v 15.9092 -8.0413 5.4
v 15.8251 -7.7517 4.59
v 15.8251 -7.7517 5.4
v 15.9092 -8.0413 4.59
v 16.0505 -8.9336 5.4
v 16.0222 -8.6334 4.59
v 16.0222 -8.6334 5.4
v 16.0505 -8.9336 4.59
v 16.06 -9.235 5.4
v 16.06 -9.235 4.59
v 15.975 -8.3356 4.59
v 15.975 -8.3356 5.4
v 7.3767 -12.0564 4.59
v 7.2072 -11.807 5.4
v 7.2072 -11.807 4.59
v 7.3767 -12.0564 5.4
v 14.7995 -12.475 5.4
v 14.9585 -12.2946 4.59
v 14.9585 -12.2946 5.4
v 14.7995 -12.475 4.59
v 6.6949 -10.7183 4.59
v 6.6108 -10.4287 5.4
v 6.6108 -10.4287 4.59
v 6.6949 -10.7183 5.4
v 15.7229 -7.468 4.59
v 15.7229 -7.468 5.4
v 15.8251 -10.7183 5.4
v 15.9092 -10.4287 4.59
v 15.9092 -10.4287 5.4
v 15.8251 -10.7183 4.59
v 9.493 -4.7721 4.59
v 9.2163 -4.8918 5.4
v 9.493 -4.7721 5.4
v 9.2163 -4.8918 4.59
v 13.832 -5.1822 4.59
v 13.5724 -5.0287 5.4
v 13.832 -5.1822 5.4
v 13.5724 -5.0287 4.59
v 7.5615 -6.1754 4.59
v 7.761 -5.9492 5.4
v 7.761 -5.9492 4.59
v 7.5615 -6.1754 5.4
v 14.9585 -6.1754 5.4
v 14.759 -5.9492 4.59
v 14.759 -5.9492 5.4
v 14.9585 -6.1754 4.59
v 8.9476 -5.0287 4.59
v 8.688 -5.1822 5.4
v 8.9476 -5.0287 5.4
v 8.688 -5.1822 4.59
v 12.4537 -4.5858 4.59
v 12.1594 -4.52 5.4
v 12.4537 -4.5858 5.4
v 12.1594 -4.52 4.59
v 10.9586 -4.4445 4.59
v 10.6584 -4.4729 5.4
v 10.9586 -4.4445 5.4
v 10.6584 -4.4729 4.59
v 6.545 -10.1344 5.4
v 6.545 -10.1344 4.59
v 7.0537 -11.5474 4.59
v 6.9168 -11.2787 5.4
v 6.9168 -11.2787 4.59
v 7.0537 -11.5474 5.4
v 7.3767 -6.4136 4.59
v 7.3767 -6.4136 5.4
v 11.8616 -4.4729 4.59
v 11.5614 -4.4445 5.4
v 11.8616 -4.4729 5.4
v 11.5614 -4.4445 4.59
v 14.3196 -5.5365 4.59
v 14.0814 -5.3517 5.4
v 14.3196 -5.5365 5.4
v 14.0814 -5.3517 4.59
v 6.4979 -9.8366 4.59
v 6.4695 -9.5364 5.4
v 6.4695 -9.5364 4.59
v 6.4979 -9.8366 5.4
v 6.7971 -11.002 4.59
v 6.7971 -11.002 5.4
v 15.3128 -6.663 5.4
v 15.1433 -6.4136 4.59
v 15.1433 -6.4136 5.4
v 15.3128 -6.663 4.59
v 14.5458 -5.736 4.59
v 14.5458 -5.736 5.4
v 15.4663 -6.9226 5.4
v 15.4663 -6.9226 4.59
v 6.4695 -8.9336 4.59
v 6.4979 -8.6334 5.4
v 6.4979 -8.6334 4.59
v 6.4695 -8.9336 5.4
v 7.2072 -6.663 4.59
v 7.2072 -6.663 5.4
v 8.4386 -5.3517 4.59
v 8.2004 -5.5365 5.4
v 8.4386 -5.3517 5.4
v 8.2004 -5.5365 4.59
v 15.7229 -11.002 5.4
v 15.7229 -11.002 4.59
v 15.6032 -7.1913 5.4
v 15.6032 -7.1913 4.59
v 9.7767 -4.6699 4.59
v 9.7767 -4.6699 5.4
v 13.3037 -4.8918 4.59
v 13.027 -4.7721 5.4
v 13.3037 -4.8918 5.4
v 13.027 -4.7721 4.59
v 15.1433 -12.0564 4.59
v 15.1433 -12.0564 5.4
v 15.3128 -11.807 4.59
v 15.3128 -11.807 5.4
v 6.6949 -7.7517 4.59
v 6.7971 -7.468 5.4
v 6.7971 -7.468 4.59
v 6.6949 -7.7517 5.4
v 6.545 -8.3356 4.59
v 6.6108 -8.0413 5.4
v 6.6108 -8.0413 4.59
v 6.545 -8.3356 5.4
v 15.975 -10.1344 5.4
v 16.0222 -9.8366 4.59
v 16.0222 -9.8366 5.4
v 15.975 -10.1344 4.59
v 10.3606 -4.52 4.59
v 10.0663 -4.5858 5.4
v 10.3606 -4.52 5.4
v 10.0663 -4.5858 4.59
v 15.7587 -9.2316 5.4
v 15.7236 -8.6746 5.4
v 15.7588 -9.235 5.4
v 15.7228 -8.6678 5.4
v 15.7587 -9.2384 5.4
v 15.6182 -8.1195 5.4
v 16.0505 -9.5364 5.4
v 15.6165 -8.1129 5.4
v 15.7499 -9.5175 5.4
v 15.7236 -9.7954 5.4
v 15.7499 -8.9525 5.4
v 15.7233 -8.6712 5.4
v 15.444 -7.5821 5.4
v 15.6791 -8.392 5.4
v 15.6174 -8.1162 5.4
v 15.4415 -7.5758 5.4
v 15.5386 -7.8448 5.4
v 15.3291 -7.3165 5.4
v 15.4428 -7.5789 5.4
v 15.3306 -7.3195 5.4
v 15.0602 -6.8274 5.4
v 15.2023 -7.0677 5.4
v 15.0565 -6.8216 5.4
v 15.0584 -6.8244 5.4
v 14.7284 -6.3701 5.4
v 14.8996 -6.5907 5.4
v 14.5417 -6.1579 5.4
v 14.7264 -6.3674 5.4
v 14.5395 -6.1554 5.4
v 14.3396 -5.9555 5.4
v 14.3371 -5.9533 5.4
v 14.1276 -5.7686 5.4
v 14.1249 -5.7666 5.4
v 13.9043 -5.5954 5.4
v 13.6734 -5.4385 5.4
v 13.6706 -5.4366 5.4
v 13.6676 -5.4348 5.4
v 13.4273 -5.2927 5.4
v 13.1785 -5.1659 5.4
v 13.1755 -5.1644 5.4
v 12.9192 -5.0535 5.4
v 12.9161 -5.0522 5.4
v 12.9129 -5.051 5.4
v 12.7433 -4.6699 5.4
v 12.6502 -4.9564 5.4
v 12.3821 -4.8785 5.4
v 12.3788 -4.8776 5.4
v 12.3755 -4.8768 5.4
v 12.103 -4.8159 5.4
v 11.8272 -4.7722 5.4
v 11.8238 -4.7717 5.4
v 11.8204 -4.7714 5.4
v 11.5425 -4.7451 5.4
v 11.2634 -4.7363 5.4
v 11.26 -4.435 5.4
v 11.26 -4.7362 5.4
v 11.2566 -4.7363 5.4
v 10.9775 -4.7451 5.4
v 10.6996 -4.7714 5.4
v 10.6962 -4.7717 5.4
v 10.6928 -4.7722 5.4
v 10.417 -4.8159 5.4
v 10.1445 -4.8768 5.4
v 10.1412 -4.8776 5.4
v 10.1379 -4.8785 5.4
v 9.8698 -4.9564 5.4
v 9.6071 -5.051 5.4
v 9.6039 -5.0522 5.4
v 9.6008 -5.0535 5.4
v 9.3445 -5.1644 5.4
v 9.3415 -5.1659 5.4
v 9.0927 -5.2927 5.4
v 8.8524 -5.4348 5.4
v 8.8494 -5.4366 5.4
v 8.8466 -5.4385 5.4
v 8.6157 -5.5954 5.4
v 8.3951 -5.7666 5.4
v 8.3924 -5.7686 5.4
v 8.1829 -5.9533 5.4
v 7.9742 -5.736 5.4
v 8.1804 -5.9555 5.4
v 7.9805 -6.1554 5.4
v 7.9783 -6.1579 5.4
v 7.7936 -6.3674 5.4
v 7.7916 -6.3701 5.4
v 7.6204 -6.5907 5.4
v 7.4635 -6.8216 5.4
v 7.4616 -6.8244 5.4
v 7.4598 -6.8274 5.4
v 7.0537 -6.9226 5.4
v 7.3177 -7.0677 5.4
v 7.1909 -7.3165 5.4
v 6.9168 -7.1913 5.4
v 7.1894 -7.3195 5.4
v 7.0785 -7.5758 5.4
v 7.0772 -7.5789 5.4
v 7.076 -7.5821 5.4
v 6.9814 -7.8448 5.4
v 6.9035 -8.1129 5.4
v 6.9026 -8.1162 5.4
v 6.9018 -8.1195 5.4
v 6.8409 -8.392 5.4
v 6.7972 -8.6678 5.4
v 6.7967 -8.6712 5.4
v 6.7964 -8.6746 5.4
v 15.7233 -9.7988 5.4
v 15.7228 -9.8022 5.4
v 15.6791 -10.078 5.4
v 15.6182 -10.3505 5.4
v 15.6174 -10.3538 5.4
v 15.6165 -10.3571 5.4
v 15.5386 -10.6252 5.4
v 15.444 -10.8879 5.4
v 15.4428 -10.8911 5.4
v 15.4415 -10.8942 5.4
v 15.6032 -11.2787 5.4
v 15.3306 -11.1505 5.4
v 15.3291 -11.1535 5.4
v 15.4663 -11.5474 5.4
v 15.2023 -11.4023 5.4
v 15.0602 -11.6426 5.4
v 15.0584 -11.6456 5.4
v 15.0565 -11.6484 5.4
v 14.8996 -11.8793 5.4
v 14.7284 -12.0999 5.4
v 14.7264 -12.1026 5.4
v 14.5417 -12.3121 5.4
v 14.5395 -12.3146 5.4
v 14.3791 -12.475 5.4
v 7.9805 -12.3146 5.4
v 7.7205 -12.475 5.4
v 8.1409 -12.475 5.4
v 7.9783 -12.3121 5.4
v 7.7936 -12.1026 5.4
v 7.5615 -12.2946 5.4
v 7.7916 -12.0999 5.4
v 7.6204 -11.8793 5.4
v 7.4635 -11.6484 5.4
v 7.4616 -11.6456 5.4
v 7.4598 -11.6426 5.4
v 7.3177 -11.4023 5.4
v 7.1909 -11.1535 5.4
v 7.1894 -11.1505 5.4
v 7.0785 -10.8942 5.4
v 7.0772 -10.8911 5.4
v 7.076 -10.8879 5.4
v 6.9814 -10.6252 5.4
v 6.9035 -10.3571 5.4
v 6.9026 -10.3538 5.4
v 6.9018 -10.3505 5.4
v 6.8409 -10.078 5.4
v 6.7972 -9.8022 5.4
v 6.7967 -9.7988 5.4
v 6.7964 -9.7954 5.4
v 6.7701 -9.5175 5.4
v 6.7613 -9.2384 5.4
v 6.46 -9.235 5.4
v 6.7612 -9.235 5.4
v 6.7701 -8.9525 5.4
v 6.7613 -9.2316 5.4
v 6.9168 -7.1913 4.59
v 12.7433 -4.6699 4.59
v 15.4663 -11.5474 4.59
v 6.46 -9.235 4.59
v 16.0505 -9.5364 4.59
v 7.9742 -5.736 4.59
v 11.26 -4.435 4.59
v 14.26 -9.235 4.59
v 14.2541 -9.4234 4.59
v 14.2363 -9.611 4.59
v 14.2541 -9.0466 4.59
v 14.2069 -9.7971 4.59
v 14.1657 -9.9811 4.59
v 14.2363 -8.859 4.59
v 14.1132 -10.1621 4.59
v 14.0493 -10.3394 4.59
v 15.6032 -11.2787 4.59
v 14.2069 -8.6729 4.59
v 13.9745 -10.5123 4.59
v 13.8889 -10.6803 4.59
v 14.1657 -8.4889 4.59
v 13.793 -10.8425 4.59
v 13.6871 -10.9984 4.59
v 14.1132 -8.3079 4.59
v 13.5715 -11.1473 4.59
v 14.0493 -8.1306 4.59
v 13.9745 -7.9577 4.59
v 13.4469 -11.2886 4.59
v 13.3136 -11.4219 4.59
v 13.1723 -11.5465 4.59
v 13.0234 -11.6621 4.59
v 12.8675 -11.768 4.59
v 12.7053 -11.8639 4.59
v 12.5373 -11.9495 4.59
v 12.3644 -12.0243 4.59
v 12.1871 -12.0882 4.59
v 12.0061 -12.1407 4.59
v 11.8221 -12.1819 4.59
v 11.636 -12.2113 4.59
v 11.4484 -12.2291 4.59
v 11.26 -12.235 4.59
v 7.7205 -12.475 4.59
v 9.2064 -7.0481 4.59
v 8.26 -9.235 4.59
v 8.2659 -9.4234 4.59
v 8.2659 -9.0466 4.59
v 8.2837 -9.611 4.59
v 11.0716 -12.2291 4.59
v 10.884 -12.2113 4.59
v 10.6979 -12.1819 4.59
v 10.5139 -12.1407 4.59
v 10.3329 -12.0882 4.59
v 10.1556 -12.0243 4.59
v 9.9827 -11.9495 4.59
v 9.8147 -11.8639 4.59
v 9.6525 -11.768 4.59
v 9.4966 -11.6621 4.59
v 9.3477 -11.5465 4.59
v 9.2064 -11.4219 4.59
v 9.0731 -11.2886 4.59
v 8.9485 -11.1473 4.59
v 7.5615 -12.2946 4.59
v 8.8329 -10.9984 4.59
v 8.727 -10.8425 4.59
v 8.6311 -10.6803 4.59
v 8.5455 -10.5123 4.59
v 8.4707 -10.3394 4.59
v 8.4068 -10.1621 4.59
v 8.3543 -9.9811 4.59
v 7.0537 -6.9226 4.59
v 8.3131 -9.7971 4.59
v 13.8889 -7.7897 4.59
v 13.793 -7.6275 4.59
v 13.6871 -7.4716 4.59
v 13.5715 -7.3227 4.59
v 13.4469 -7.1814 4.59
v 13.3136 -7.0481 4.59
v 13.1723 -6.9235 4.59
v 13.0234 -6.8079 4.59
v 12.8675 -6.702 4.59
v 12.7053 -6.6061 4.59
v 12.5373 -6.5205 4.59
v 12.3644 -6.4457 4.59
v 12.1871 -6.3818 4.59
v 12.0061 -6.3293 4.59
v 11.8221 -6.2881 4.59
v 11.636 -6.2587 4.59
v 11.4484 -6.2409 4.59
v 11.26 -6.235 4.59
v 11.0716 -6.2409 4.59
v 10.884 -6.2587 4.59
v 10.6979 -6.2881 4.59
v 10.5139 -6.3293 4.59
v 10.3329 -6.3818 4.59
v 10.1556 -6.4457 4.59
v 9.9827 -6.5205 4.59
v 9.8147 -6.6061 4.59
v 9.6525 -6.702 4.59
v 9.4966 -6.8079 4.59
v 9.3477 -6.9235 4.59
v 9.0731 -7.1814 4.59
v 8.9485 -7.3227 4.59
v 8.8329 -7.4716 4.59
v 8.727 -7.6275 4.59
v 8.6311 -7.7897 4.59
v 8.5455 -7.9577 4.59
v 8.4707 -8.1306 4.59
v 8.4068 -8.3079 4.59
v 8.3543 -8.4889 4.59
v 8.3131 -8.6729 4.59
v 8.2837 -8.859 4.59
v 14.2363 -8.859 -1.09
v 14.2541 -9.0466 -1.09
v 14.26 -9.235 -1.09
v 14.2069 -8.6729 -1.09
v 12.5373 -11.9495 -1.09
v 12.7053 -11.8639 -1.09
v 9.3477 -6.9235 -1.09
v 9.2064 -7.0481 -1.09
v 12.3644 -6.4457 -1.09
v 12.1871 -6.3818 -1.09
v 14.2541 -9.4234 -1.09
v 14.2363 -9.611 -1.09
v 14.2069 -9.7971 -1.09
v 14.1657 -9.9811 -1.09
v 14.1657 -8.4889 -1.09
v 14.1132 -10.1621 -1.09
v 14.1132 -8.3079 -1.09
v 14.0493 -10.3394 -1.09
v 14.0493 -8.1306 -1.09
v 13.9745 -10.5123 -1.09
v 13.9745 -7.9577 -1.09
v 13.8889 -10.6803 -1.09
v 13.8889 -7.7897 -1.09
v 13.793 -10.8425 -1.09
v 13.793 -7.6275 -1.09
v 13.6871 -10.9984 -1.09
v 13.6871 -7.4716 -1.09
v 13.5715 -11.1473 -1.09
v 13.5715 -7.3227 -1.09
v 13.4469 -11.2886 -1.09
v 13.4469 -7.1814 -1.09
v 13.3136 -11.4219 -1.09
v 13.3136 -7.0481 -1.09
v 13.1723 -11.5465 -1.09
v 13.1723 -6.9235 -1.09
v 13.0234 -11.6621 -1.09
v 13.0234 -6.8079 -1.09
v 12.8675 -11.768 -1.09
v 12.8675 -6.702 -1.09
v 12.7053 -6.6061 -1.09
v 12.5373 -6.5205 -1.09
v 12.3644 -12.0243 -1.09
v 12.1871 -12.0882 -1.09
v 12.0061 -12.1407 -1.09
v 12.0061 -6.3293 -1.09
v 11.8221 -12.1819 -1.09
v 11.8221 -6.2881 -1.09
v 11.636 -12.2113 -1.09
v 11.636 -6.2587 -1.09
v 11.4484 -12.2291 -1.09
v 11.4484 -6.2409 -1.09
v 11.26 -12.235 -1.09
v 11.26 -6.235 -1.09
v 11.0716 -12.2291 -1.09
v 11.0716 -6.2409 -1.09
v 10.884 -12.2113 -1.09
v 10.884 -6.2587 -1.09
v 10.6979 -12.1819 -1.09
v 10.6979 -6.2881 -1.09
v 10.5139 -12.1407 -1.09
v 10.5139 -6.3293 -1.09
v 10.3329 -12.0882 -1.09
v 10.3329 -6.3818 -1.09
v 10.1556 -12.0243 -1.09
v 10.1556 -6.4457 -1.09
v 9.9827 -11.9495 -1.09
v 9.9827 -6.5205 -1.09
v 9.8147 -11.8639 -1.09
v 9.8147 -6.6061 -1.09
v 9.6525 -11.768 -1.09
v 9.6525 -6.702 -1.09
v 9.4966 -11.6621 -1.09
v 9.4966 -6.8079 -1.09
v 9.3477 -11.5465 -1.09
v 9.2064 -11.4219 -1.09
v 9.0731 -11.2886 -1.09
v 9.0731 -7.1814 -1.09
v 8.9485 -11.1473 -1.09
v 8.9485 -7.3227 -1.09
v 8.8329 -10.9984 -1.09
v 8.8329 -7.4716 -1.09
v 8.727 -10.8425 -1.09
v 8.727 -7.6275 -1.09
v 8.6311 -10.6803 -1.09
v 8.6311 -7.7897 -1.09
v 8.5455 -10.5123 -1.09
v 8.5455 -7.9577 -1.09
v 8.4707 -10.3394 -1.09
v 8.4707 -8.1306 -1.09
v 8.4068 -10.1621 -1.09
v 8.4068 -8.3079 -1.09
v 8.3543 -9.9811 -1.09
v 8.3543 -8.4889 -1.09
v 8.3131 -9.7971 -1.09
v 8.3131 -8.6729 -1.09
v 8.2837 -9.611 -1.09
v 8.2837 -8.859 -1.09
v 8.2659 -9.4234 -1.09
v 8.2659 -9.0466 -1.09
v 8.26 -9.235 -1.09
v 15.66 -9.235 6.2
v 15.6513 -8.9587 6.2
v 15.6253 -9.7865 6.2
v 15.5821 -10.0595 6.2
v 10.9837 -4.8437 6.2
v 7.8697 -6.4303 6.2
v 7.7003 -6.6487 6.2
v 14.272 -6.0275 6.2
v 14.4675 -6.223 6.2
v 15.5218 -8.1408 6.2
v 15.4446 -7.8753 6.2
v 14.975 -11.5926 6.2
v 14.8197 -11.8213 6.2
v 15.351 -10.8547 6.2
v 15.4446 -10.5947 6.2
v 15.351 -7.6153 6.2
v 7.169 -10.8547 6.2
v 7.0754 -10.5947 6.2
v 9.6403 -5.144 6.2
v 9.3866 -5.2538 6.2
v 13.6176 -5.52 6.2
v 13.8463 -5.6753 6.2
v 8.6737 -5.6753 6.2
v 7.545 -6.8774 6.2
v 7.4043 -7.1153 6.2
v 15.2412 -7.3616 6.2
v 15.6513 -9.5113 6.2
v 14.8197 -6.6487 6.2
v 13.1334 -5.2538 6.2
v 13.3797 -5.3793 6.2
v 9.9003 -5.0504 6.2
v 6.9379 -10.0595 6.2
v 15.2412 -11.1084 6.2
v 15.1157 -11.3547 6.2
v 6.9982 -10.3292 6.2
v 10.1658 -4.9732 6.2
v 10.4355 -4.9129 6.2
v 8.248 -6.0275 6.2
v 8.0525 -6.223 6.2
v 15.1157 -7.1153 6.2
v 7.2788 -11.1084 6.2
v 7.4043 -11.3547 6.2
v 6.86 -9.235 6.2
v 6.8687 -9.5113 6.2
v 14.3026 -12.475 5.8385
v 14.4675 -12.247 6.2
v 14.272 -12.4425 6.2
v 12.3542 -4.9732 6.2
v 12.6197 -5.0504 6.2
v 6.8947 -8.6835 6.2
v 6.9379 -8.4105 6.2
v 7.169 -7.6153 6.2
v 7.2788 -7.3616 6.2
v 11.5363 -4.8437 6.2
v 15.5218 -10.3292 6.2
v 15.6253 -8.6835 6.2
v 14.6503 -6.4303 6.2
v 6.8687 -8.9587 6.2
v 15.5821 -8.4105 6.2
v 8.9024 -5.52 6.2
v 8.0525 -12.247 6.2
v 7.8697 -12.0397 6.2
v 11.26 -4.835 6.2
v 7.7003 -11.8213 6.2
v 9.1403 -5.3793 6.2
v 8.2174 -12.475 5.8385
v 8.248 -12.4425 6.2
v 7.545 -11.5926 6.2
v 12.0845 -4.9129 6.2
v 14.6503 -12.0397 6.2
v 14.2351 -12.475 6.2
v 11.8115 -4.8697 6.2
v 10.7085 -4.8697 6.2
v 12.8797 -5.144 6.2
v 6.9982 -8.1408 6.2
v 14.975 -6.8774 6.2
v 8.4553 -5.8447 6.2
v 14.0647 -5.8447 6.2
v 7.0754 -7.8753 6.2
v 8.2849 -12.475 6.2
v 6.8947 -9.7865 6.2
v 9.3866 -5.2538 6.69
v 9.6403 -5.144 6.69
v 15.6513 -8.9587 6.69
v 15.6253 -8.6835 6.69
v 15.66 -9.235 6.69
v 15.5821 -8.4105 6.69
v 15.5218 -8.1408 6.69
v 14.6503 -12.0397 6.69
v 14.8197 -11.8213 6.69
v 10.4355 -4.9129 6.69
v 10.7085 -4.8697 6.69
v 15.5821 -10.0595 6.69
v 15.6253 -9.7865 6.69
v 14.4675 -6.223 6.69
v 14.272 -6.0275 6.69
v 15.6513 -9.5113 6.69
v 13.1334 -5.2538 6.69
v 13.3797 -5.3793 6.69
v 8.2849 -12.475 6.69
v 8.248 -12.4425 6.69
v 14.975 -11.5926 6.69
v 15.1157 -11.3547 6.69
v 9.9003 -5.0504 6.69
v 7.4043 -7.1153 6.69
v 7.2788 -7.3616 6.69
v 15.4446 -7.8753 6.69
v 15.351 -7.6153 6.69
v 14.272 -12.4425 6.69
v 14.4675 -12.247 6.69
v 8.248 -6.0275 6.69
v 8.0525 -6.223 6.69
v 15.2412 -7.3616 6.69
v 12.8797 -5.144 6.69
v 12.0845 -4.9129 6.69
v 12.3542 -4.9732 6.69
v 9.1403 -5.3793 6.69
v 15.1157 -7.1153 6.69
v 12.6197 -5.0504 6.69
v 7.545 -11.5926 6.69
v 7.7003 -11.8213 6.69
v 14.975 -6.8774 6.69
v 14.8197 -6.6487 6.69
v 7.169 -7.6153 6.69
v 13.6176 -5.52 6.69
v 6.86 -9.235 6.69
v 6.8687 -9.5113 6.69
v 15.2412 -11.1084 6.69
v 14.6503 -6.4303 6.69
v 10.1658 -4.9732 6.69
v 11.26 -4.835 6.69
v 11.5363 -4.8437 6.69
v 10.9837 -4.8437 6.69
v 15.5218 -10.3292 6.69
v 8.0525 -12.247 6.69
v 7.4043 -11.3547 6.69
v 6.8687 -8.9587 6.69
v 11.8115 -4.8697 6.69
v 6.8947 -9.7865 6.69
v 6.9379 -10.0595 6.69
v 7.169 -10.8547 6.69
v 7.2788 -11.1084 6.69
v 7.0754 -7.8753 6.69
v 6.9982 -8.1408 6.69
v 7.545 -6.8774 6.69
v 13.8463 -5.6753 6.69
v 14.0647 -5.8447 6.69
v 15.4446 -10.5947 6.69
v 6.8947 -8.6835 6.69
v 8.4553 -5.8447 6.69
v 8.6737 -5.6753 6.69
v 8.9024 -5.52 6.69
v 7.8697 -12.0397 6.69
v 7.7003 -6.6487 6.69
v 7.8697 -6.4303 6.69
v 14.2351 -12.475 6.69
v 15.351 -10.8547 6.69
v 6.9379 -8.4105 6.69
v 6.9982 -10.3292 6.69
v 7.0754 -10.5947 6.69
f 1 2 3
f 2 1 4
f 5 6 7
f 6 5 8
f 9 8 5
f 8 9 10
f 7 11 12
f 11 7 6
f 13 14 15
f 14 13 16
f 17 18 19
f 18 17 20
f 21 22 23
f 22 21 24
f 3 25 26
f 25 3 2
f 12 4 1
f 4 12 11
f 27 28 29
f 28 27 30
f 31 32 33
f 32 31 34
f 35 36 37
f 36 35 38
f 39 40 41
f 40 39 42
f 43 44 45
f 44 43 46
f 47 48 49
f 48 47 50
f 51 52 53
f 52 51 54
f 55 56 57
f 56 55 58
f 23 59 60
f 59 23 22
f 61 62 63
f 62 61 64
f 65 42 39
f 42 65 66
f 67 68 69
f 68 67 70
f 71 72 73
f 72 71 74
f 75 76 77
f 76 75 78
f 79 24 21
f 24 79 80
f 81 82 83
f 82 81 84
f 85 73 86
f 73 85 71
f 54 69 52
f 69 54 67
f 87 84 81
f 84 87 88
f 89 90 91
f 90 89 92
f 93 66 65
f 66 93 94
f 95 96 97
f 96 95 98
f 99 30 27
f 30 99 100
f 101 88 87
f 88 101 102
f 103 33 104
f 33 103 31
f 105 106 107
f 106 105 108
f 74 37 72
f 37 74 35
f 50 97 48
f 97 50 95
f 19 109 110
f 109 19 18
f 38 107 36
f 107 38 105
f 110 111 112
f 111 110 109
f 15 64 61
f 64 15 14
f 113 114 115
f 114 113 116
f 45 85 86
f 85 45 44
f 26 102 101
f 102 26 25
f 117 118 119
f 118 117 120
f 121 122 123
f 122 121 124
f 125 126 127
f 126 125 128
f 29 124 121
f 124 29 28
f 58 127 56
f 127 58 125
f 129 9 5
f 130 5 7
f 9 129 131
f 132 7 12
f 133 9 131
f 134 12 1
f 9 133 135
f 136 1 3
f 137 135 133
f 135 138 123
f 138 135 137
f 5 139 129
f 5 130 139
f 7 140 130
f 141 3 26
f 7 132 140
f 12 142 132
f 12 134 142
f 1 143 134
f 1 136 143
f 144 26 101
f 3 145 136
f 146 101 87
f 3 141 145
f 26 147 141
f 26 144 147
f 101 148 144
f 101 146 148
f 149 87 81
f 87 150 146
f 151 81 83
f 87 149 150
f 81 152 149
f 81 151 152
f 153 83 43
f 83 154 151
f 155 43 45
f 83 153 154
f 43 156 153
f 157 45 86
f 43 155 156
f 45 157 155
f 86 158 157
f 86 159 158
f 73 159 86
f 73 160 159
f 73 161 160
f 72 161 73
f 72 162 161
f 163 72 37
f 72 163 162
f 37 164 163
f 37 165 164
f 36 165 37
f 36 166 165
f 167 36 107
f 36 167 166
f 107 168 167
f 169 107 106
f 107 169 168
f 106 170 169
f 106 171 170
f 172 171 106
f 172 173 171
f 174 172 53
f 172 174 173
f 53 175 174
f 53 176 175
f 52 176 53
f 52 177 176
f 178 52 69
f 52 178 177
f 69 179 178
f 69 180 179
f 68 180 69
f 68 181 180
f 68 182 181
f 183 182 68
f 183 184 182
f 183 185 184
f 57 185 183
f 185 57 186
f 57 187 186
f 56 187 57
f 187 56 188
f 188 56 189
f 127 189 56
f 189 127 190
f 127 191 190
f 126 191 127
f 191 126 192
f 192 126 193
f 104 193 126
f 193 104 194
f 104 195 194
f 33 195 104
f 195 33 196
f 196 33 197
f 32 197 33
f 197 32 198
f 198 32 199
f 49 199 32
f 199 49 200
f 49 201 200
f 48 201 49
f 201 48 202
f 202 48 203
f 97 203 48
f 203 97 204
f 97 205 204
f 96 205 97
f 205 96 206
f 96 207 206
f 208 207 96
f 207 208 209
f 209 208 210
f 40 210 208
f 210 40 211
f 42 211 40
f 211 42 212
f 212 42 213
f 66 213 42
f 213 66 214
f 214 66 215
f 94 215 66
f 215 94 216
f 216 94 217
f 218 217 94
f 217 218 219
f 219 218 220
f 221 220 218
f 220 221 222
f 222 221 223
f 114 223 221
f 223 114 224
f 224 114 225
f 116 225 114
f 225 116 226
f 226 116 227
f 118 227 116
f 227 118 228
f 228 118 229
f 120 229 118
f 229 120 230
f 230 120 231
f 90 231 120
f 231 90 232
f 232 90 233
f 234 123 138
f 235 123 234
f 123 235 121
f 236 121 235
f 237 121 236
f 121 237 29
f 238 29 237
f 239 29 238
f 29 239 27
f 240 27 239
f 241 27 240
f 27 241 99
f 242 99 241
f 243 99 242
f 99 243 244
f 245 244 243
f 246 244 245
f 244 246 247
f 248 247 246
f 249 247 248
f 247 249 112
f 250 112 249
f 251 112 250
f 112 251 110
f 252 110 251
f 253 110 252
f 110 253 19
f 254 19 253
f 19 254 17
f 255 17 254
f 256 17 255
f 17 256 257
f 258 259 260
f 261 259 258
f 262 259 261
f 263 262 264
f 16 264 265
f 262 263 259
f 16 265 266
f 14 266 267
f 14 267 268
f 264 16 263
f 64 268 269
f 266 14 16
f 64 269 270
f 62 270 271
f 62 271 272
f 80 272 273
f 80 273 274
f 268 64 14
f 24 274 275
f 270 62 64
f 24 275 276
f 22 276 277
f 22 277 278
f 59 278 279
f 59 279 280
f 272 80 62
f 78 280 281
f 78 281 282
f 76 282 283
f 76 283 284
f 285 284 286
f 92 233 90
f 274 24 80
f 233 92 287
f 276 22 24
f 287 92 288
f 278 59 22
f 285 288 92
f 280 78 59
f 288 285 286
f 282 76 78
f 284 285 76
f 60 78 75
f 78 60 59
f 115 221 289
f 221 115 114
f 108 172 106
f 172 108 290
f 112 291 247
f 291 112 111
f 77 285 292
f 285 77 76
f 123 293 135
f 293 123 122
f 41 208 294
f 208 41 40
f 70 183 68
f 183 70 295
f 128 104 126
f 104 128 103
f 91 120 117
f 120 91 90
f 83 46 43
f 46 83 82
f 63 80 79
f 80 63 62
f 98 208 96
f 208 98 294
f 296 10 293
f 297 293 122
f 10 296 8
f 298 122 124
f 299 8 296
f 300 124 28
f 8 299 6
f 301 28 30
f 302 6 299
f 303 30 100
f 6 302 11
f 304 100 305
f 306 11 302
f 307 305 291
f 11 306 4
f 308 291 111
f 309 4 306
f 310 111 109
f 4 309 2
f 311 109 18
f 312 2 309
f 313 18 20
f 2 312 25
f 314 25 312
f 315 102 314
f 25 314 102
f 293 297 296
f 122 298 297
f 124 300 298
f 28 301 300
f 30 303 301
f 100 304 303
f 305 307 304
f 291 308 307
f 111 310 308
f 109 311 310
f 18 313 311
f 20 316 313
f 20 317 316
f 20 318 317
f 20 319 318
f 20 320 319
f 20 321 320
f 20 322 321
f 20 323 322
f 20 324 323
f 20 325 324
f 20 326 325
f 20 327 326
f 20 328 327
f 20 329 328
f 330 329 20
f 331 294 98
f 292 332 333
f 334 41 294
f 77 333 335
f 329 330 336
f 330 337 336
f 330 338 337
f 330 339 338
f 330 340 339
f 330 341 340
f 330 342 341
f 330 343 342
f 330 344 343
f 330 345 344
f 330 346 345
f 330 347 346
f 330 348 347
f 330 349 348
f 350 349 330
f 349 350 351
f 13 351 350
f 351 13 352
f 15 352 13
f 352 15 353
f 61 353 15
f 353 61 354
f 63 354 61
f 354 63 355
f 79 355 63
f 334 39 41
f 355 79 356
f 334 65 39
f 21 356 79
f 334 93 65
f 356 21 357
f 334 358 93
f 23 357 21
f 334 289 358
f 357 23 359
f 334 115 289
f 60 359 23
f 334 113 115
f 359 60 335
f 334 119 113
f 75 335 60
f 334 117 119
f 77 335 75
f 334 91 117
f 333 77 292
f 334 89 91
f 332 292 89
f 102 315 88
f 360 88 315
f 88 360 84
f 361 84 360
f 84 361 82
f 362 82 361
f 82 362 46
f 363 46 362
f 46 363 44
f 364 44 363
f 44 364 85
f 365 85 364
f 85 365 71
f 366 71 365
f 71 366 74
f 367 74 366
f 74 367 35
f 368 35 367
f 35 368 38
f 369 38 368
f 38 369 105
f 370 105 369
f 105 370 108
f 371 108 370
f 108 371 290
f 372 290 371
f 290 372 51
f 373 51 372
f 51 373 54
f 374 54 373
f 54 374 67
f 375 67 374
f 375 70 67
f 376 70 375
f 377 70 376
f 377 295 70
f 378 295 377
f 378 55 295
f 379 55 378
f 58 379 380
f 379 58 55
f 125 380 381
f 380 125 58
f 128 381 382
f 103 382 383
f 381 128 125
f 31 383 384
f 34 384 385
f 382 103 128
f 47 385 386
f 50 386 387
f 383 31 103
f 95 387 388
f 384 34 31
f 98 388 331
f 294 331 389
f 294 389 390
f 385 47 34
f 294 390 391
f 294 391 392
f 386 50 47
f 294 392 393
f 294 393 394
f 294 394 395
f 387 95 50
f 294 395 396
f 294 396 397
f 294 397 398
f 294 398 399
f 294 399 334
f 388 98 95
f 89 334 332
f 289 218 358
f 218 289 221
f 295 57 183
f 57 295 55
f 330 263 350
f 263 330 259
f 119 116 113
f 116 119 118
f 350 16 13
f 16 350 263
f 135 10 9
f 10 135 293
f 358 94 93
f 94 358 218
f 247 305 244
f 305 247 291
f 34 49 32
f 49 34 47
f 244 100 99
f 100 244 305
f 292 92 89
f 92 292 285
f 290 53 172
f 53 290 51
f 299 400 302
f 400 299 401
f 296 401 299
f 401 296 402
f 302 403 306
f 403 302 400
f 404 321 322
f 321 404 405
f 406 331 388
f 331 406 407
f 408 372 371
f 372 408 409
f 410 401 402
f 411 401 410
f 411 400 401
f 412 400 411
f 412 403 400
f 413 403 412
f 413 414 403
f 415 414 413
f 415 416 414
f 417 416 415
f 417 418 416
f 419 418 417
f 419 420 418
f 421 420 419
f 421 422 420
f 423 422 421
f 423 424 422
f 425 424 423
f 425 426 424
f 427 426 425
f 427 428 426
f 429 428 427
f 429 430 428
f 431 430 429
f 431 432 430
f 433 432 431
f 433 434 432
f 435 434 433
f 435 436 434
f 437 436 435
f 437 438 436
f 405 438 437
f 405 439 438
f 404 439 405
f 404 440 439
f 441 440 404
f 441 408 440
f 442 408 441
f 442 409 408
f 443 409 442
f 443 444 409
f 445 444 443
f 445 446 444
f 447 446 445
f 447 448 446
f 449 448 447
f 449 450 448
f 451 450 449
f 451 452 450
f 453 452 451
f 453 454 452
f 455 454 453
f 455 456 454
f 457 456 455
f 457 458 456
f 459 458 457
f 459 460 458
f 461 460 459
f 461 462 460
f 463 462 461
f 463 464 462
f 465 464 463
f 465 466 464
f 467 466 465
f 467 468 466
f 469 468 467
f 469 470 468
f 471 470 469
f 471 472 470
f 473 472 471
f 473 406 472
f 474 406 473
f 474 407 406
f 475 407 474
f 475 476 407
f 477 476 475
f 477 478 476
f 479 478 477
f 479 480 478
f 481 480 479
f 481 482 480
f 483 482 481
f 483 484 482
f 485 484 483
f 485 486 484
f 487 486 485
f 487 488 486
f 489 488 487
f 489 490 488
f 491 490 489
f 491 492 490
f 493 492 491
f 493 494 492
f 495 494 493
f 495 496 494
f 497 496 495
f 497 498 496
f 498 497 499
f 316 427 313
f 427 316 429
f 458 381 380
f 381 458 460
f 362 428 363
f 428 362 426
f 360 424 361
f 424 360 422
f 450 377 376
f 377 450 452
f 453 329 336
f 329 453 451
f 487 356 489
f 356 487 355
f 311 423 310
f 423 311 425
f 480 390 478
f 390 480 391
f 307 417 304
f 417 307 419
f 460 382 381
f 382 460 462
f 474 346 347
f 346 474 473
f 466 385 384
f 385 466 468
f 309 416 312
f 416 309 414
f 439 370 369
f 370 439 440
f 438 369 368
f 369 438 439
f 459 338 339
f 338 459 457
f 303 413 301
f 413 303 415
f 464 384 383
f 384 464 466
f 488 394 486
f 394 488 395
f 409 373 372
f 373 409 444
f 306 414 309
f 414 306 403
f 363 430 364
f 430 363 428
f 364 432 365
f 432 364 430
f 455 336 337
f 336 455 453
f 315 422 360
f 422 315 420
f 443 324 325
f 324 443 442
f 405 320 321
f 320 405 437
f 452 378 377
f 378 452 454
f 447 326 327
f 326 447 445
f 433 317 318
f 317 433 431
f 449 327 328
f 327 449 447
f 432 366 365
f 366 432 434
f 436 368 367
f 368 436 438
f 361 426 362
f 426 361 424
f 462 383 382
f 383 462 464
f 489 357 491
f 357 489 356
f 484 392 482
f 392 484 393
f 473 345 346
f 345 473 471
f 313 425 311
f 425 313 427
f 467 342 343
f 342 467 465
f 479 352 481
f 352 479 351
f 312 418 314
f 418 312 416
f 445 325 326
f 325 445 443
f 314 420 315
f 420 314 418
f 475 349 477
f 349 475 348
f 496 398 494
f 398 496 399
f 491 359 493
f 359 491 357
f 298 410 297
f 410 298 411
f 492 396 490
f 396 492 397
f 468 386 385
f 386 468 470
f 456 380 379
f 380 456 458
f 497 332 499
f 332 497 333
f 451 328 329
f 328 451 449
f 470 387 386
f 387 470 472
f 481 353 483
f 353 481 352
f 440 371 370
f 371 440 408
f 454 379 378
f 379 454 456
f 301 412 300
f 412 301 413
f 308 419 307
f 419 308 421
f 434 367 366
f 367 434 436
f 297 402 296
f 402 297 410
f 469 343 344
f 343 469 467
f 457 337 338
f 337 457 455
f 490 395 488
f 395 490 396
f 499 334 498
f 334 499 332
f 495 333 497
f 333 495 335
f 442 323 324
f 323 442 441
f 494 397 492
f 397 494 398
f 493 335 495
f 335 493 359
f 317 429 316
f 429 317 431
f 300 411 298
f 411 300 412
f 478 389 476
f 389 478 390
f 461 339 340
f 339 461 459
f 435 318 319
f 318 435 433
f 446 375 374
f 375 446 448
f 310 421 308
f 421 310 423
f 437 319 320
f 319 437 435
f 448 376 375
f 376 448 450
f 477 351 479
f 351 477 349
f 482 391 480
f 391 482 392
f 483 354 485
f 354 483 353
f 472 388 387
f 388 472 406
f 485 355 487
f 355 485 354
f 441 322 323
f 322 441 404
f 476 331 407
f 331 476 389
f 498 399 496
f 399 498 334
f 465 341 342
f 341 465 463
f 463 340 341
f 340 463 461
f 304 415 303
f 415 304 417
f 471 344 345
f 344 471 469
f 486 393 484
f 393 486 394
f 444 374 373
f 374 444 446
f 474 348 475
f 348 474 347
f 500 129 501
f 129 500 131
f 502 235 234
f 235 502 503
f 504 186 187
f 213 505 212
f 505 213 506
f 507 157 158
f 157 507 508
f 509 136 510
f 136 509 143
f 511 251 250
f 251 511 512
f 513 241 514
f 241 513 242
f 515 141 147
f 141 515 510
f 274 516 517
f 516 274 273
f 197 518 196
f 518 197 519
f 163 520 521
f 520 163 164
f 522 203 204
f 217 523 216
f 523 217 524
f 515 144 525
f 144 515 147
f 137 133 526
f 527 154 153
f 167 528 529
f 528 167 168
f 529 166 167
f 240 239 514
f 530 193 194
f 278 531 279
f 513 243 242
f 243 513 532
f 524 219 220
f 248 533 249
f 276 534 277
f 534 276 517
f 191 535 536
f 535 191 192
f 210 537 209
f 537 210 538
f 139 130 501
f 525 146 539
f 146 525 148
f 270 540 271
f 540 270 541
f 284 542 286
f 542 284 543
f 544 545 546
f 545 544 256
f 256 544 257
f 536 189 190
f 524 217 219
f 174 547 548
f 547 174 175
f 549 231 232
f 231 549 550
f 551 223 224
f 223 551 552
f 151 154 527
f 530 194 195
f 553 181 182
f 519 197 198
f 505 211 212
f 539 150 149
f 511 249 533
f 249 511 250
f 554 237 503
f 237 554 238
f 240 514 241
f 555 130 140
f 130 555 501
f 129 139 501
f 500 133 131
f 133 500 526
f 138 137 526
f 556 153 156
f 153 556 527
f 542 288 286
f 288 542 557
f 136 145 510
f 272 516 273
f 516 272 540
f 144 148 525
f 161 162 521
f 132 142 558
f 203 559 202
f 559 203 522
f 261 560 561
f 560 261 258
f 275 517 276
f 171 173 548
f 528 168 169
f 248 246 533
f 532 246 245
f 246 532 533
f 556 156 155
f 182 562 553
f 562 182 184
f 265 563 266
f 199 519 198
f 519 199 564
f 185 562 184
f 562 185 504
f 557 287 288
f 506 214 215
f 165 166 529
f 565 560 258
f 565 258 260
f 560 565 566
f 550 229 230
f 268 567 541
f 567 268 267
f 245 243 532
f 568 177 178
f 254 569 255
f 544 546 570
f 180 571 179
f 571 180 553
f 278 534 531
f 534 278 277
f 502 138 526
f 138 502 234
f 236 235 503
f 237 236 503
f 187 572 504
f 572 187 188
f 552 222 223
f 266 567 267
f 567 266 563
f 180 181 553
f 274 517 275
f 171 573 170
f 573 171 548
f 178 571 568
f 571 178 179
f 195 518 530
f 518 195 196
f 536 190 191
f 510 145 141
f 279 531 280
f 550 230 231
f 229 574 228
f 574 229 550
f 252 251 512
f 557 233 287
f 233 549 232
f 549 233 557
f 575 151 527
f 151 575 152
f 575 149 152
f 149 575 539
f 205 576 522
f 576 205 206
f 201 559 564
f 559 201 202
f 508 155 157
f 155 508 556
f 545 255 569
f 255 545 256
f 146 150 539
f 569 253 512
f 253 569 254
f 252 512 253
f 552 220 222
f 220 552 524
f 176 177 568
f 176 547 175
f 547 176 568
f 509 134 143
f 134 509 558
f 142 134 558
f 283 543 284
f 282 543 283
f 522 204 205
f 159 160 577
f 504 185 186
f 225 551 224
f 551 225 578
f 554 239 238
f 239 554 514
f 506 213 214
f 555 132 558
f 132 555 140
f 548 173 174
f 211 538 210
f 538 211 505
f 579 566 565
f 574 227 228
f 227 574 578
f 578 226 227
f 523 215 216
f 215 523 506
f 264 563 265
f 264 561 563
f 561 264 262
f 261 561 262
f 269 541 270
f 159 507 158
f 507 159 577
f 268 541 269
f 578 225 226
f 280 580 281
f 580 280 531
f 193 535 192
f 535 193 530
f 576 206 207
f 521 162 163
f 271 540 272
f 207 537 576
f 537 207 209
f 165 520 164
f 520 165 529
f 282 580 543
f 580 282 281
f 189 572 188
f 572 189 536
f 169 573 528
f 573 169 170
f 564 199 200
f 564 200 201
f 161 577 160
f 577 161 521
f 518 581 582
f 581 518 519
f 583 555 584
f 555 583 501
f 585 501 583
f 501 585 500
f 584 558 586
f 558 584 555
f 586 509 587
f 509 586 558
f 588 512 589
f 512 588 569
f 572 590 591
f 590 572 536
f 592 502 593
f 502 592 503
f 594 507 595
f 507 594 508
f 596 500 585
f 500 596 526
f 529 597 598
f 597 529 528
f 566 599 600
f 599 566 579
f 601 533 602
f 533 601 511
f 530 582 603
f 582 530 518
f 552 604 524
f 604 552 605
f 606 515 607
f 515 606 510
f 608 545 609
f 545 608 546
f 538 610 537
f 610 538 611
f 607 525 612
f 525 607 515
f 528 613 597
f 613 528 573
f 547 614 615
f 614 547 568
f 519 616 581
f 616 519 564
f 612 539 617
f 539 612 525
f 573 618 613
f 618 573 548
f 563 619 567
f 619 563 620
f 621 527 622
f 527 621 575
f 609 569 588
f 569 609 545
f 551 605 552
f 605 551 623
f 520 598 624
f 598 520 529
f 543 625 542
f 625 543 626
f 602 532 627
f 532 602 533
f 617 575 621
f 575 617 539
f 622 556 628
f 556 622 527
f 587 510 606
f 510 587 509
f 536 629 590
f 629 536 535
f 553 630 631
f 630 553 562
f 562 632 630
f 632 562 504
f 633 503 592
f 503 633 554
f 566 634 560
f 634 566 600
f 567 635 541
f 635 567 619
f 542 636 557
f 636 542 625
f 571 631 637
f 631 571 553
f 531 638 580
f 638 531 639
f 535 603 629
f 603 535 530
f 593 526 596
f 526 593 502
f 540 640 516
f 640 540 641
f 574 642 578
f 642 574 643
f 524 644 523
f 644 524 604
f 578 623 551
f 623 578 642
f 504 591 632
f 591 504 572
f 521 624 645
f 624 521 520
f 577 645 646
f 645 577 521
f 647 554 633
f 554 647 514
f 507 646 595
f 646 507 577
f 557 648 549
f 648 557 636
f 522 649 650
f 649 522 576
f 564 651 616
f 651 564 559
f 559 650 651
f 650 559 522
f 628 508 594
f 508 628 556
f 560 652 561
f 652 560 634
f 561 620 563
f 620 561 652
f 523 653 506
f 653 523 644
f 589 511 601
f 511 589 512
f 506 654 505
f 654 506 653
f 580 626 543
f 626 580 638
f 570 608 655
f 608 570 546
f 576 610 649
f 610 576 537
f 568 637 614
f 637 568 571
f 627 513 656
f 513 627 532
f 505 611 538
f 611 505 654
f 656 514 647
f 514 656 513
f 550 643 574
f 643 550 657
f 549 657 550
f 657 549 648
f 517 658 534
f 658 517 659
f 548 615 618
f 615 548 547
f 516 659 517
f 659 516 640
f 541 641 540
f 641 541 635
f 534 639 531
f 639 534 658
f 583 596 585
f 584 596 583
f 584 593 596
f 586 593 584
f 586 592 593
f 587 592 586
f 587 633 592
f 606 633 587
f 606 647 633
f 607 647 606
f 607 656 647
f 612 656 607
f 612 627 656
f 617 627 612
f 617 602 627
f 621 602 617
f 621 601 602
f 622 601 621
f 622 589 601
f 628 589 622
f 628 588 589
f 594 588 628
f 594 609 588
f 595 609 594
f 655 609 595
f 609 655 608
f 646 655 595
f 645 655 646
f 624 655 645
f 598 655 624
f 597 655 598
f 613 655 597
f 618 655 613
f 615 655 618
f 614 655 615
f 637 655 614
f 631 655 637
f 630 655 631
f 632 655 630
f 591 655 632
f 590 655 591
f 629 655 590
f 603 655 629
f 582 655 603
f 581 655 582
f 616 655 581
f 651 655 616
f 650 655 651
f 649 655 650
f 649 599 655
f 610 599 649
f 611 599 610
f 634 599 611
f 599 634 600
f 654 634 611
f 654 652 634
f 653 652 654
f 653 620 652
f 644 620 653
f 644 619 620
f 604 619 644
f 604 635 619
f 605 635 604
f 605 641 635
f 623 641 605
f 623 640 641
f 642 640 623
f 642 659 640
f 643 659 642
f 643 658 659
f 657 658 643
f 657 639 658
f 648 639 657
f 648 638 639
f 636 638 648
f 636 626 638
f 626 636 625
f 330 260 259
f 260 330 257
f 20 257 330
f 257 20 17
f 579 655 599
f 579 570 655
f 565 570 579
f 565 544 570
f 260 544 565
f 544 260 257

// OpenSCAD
fn = 100;
fs = 0.6;
eps = 0.01;
w = 1.2;

nano_length = 44 + 0.5;
nano_width = 17.7 + 0.5;
nano_height = 1.65 + 0.3;

nano_anthena_length = 15.3 + 0.5;
nano_anthena_width = 10 + 0.5;
nano_anthena_height = 4 + 0.3;

nano_usb_length = 5.6 + 0.5;
nano_usb_width = 7.6 + 0.5;
nano_usb_height = 4.3 + 0.3;

nano_middle_width = 13.7;


battery_holder_length = 23.7 + 0.5;
battery_holder_width = 28 + 0.5;
battery_holder_height_nc = 1.6; // 1.6 sharp without clerance
battery_holder_height = battery_holder_height_nc + 0.2;
battery_d = 20 + 0.5;
battery_and_holder_length = 25.15;

battery_and_holder_height_nc = 5.78;  // 5.78 max without clearance
battery_and_holder_height = battery_and_holder_height_nc + 0.4;

battery_upper_length = 15 + 0.5;
battery_upper_width = 21.3 + 0.5;
battery_only_height_nc = battery_and_holder_height_nc - battery_holder_height_nc;

battery_hole_d = 2.5;
battery_hole_y_offset = (20.7 + battery_hole_d) / 2;
battery_hole_x_offset = (16 + battery_hole_d) / 2;

hole_from_edge_x = battery_holder_length / 2 - battery_hole_x_offset;
hole_from_edge_y = battery_holder_width / 2 - battery_hole_y_offset;

module nano() {
  translate([0,0, nano_height/2])
  cube([nano_length,nano_width,nano_height], center = true);

//  translate([5,0, nano_usb_height/2])
//  cube([nano_length - nano_usb_length - nano_anthena_length - 2,
//       nano_middle_width, nano_usb_height], center = true);

  translate([-nano_length/2 + nano_anthena_length / 2,
      0,
      nano_anthena_height / 2])
    cube([nano_anthena_length,
        nano_anthena_width,
        nano_anthena_height], center = true);

  translate([nano_length/2 - nano_usb_length / 2,
      0,
      nano_usb_height / 2])
    cube([nano_usb_length,
        nano_usb_width,
        nano_usb_height], center = true);

  // contacts
  translate([-nano_length/2 + 6.5, - 1.4 + nano_width/2, 0]) cylinder(d=2, h=4.5, $fn=10);
  translate([ nano_length/2 - 6.0, - 1.4 + nano_width/2, 0]) cylinder(d=2, h=4.5, $fn=10);
}

module battery() {
  difference() {
    union() {
      translate([0,0,battery_holder_height/2]) cube([battery_holder_length,
          battery_holder_width,
          battery_holder_height
      ], center = true);
      target_offset = battery_and_holder_length - battery_holder_length;
      edge_offset = battery_holder_length / 2 - battery_d / 2;
      translate([-edge_offset - target_offset, 0, battery_holder_height]) {
        cylinder(d=battery_d, h=battery_only_height_nc - 0.2, $fn=40);
        translate([0,0, (battery_and_holder_height - battery_holder_height)/2])
          cube([battery_upper_length,
              battery_upper_width,
              battery_only_height_nc], center = true);
      }
    };
    union() {
      translate([-battery_hole_x_offset, -battery_hole_y_offset, -eps])
        cylinder(d = battery_hole_d, h=battery_and_holder_height + eps * 2, $fn=10);
      translate([ battery_hole_x_offset, -battery_hole_y_offset, -eps])
        cylinder(d = battery_hole_d, h=battery_and_holder_height + eps * 2, $fn=10);
      translate([-battery_hole_x_offset,  battery_hole_y_offset, -eps])
        cylinder(d = battery_hole_d, h=battery_and_holder_height + eps * 2, $fn=10);
      translate([ battery_hole_x_offset,  battery_hole_y_offset, -eps])
        cylinder(d = battery_hole_d, h=battery_and_holder_height + eps * 2, $fn=10);
    };
  }
}

button_width = 6.18 + 0.5;
button_height = 3.5 + 0.5;
button_d = 3.4 + 0.5;
button_d_h = 4.9 + 0.5;
button_d_h_real = 4.9;

module button() {
  translate([0,0,button_height/2])
  cube([button_width, button_width, button_height], center = true);
  cylinder(d = button_d, h = button_d_h, $fn = 20);
}

middle_pad = 0.2;

screw_outer_d = 10;
button_offset_x = nano_length - button_width / 2 - screw_outer_d / 2 - hole_from_edge_y;
button_offset_y = button_width / 2;


module components() {
  nano_offset_y = box_width - nano_width;
  nano_offset_z = battery_and_holder_height + middle_pad;

  color("green")
    translate([button_offset_x, button_offset_y, w])
      button();

  color("blue")
    translate([battery_holder_width / 2,
        battery_holder_length / 2,
        battery_and_holder_height + w])
    rotate(-90, [0,0,1])
    rotate(180, [1,0,0])
    battery();

  color("cyan")
    translate([nano_length/2, nano_width/2 + nano_offset_y, w + nano_offset_z])
    rotate(180, [0,0,1])
    nano();
}

box_length = nano_length;
box_width = battery_and_holder_length;
box_height = nano_usb_height + middle_pad + battery_and_holder_height;

// ================================


module origin(x = 0, y = 0, z = 0) {
  translate([-box_length/2 + x, -box_width/2 + y, -box_height/2 + z]) children();
}

module legacy_origin() {
  origin(0, 0, -w) children();
}

module origin_all(q) {
  origin(q, q, q) children();
}

module mirrorX() { mirror([1,0,0]) children(); }
module mirrorY() { mirror([0,1,0]) children(); }
module mirrorZ() { mirror([0,0,1]) children(); }
module dupX() { children(); mirrorX() children(); }
module dupY() { children(); mirrorY() children(); }
module dupZ() { children(); mirrorZ() children(); }
module dupAll() { dupX() dupY() dupZ() children(); }

module cylinders(values, idx = 0) {
  if (idx < len(values)) {
    cylinder(h = values[idx][0] + eps, d1 = values[idx][1], d2 = values[idx][2], $fs=fs, $fa=1, $fn=fn);
    translate([0, 0, values[idx][0]])
      cylinders(values, idx + 1);
  }
}

// ================================

module simple_box_verbose(offx, offy, offz) {
  cube([box_length + 2 * offx, box_width + 2 * offy, box_height + 2 * offz], center = true);
}
module simple_box(off) {
  simple_box_verbose(off, off, off);
}

// Slower variant
module box1(off) {
  round_corner = 3;
  mul = sqrt(2);
  difference() {
    simple_box(off);

    // Subtract boxes from corners
    dupAll()
      origin_all(-off - eps) 
        cube(round_corner + off - eps);
  }

  // Add sphere to corner
  dupAll()
  intersection() {
    origin_all(-off) cube(round_corner + off);
    origin_all(round_corner)
      sphere(r = (round_corner + off) * mul, $fs=fs, $fa=1, $fn=fn);
  }
}

// Fast variant
module box2(off) {
  round_corner = 3;
  mul = sqrt(2);

  cube([box_length - 2 * round_corner + eps, box_width + 2 * off, box_height + 2 * off], center = true);
  cube([box_length + 2 * off, box_width - 2 * round_corner + eps, box_height + 2 * off], center = true);
  cube([box_length + 2 * off, box_width + 2 * off, box_height - 2 * round_corner + eps], center = true);

  // Add sphere to corner
  intersection() {
    simple_box(off);
    dupAll()
      origin_all(round_corner)
      sphere(r = (round_corner + off) * mul, $fs=fs, $fa=1, $fn=fn);
  }
}

module box(off) { box2(off); }

module bottom_screw_offset(off = 0) {
  origin(hole_from_edge_y, hole_from_edge_x, -off) children();
}

screw_bottom_height = battery_only_height_nc - 0.2;
screw_narrow_height = 1.5;
screw_cap = 5.5; // with clearance

module screw_add() {
  bottom_screw_offset() {
    cylinders([[screw_bottom_height,screw_outer_d,screw_outer_d]]);
  }
}

module screw_sub() {
  cap_height = w + screw_bottom_height - screw_narrow_height;
  bottom_screw_offset(w + eps) {
    cylinders([[cap_height, screw_cap + 1, screw_cap], [screw_narrow_height + 3 * eps, 3.5, 3.5]]);
  }
}

module screw_support() {
  cap_height = w + screw_bottom_height - screw_narrow_height;
  support_z_clearance = 0.35;
  bottom_screw_offset(w + eps) {
    cylinders([[cap_height - support_z_clearance, screw_cap - 0.5, screw_cap - 0.5]]);
  }
}


module screw_top(len) {
  screw_thread = 2.9;
  mirrorZ() bottom_screw_offset() difference() {
    cylinders([[len, 6, 6]]);
    cylinders([[len + 2 * eps, screw_thread-0.2, screw_thread]]);
  }
}

module top_plain() {
  translate([-30,-20,0])
  cube([60,40,20]);
}

// Divisor slope calculation
z0 = box_height / 2;
z1 = -box_height / 2 + battery_only_height_nc / 2;

module plain_transform(off = 0) {
  dz = z0 - z1;
  angle = atan2(dz, box_width);
  move = (z0 + z1) / 2 + off;
  translate([0,0,move])
  rotate(angle, [1,0,0])
  children();
}

module battery_bracket() {
  color("red")
  translate([-w, 0, 0])
    cube([w, hole_from_edge_x, battery_and_holder_height_nc]);
  cube([hole_from_edge_y, hole_from_edge_x, screw_bottom_height]);
}

module cord1() {
  mirrorX() mirrorY()
  origin()
  rotate(45, [0,0,1])
  rotate(90, [0,1,0])
  cylinder(d=2, h=10, center = true, $fs=fs, $fa=1, $fn=fn);
}

module cord() {
  translate([0,-3, 4.7]) cord1();
  translate([-3, 0, 1.7]) cord1();
}

// ziplock triangle
module lock_transform() {
  mirrorX() mirrorY() mirrorZ() origin() children();
}

triangle_sz = 2.6;

pin_length = 3;
pin_up_length = 3;
pin_spacing_length = 2.5;
pin_stride = pin_length + pin_up_length + 2 * pin_spacing_length;
base_clearance = 0.2;
padding_in = 3;
num_pins = floor((box_length - pin_length - 2 * padding_in) / pin_stride);
padding = (box_length - (pin_stride * num_pins + pin_length)) / 2;
clearance_y = base_clearance;

module triangle() {
  translate([padding, clearance_y, 0])
  rotate(90, [0,1,0])
    linear_extrude(box_length - padding * 2)
    polygon([[0,0],[-triangle_sz, 0],[0, triangle_sz]]);
}

// lock_transform() 


module zipper(clearance) {

  for (x = [0 : num_pins]) {
    translate([padding + pin_stride * x - clearance / 2,
               -w - clearance_y - eps,
               triangle_sz - w - clearance / 2])
      cube([pin_length + clearance, w + 2 * clearance_y + 2 * eps, w + clearance]);
  }

  translate([padding, clearance_y, -w])
  cube([box_length - padding * 2, triangle_sz, w]);

  for (x = [0 : num_pins - 1]) {
    translate([padding + pin_length + pin_spacing_length + pin_stride * x - clearance / 2,
               -w - eps - clearance_y,
               -w - eps - clearance / 2])
      cube([pin_length + clearance,
            w + 2 * clearance_y + 2 * eps,
            w + clearance + eps]);
  }

}

//lock_transform() {
// triangle();
//
//  color("red")
//    zipper(0);
//
//  difference() {
//    translate([0,-w,-w]) cube([box_length, w, w + triangle_sz]);
//    zipper(0.5);
//  }
//}


module bottom() {
  difference() {
    // Shell
    box(w);

    // Shell subtractions
    box(eps);
    plain_transform(-0.1) top_plain();
    cord();
    dupX() screw_sub();
    lock_transform() zipper(base_clearance);
  }

  lock_transform() 
  difference() {
    translate([padding,-w,-w])
      cube([box_length - padding * 2, w, w]);
    zipper(base_clearance);
  }

  dupX() screw_support();

  intersection() {
    box(0);

    // Additions restricted to internal space
    union() {
      dupX() {
        difference() { screw_add(); screw_sub(); }
      }
      mirrorY() origin() battery_bracket();
    }
  }

  // nano right support
  difference() {
    union() {
      mirrorX() mirrorY() origin() cube([w, nano_width, battery_and_holder_height_nc]);
      mirrorX() mirrorY() origin() cube([box_length - battery_holder_width, w, battery_and_holder_height_nc]);
    }
    cord();
  }

  // battery right support
  dupY() translate([battery_holder_width, 0, 0]) origin() mirrorX() battery_bracket();


  // Button brackets
  {
    sep_w = w;
    origin() translate([button_offset_x - button_width/2 - sep_w, 0, 0])
      cube([sep_w, button_width, button_height]);

    origin() translate([button_offset_x - w/2, button_width, 0])
      cube([w, 3, button_height]);
  }


}

shaft_d = 11;
module button_shaft() {
  cylinders([[nano_usb_height - nano_height + w, shaft_d, shaft_d]]);
}

module button_cap(off, top_height = 1.6, button_stick_out=0, eps = 0) {
  top_outer = shaft_d - 2 * 0.6;
  narrow_top_outer = top_outer - 0.8;
  narrow_height = 0.8;
  button_axe_d = 6;
  
  cylinders([[button_stick_out, narrow_top_outer + 2 * off, narrow_top_outer + 2 * off],
             [narrow_height + eps, narrow_top_outer + 2 * off, narrow_top_outer + 0.2 + 2 * off],
             [top_height - narrow_height, top_outer + 2 * off, top_outer + 2 * off],
             [box_height + w - button_d_h_real - top_height, button_axe_d, button_axe_d]]);

}

module button_transform(off = 0) {
  mirrorZ()
    translate([button_offset_x, button_offset_y, -w + off])
    origin() children();
}

module button_cap_final() {
  clearance = 0.1; // base_clearance / 2;
      intersection() {
        button_transform(-eps) button_cap(-clearance, 1.6, 0.5, 0);
        simple_box_verbose(w, -clearance, w);
      }
}

module top() {
  intersection() {
    plain_transform(0.1) top_plain();
    difference() {
      // Shell
      box(w);

      // Shell subtractions
      box(eps);
      lock_transform() translate([padding - base_clearance/2,-w - eps,-w - eps])
        cube([box_length - padding * 2 + base_clearance,
              w + clearance_y + 2 * eps,
              w + triangle_sz + 2 * eps]);

      intersection() {
        button_transform(-eps) button_cap(0, nano_usb_height - nano_height + w, 0);
        simple_box_verbose(w+eps, 0, w+eps);
      }

      d = 2.5;
      mirrorY() origin() translate([d/2 + 1, 2.5, 0]) cylinder(d=d, h=20, $fn=30);
      mirrorY() origin() translate([d/2 + 1, nano_width - 2.5, 0]) cylinder(d=d, h=20, $fn=30);
    }
  }

  screw_top(nano_usb_height);
  mirrorX() screw_top(box_height - screw_bottom_height - 0.2);

  lock_transform() { 
    triangle();
    color("red")
    zipper(0);
  }

  intersection() {
    box(0);
    button_transform(-eps)
      difference() {
        button_shaft();
        button_cap(0, nano_usb_height - nano_height + w, eps);
      }
  }
}

// bottom();
// top();
button_cap_final();

// legacy_origin() components();

module test_components() {
  difference() {
    legacy_origin() components();
    children();
  }
}

//test_components()
//  box(eps);
